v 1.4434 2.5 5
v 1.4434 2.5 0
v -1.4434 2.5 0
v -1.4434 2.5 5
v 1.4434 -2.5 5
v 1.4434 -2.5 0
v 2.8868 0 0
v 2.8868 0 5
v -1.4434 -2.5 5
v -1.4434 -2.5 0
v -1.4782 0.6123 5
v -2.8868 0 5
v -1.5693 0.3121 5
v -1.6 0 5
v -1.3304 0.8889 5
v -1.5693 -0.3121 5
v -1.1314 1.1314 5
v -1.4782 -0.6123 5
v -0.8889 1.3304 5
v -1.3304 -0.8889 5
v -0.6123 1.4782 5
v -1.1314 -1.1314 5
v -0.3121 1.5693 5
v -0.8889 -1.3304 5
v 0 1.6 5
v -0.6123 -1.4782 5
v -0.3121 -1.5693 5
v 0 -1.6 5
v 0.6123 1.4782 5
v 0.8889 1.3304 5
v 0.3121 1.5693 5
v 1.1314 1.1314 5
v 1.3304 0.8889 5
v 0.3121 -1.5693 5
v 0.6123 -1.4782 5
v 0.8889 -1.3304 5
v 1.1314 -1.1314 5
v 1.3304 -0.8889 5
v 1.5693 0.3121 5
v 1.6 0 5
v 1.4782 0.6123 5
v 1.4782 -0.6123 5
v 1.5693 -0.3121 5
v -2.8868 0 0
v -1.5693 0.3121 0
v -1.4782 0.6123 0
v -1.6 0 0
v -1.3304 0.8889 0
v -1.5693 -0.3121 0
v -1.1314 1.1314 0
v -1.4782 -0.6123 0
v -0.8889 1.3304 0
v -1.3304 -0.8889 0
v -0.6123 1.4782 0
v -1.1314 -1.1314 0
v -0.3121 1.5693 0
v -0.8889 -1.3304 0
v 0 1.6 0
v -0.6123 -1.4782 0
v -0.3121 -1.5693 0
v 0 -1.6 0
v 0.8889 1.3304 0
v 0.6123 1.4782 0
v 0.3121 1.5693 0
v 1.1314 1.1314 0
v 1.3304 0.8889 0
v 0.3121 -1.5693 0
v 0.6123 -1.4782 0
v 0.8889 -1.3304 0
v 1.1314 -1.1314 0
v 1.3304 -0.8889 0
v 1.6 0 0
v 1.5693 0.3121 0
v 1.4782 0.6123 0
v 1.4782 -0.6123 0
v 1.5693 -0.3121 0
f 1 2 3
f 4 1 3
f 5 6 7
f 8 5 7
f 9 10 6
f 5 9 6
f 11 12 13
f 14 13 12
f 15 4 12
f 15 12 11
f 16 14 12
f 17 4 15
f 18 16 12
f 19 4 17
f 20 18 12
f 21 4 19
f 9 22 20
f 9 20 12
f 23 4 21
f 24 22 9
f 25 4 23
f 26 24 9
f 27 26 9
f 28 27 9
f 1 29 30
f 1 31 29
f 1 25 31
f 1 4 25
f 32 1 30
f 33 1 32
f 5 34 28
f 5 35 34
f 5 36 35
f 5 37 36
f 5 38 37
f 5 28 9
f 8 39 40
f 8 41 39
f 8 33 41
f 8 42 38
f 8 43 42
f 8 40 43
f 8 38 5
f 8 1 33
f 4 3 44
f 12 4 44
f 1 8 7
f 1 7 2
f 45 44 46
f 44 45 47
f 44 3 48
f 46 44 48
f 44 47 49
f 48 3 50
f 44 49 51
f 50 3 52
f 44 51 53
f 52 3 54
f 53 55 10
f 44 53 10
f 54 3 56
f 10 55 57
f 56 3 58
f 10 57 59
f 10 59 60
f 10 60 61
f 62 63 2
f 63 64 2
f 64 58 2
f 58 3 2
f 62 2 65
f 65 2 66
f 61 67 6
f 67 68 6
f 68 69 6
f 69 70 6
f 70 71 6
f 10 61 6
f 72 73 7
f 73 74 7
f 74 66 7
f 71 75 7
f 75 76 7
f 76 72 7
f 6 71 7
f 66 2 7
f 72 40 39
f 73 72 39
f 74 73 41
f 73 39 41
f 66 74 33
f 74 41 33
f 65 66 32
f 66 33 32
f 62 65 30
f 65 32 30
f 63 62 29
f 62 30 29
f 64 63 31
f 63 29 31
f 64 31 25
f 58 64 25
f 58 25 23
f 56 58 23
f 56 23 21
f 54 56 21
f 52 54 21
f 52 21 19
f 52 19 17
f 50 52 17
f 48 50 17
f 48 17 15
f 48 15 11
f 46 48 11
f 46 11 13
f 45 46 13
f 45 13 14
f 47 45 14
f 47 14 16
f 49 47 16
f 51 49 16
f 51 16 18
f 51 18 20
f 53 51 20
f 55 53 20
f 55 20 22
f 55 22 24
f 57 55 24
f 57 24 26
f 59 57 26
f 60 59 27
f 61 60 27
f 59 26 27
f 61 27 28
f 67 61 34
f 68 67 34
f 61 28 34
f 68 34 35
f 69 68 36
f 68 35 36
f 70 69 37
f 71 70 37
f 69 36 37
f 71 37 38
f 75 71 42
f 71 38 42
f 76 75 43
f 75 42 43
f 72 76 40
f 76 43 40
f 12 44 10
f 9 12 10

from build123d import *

# Parameters (mm, degrees)
F1_DEPTH = 5
F2_COUNT = 6
F2_ANGLE = 300
F3_R     = 1.6
F4_DEPTH = 5.001


with BuildPart() as f1:
    # F0 (on Top) → F1 (new body)
    with BuildSketch(Plane.XY):
        Polygon((-1.443376, 2.5), (0, 0), (1.443376, 2.5), align=None)
    extrude(amount=F1_DEPTH)

    # F2: F1 ×6 about axis
    f2_axis = Axis((0, 0, 2.5), (0, 0, 1))


with BuildPart() as f1_1:
    add(f1.part)
    for i in range(1, F2_COUNT):
        add(f1.part.rotate(f2_axis, i * F2_ANGLE / (F2_COUNT - 1)))

    # F3 (on face) → F4 (cut, through all)
    with BuildSketch(Plane.XY.offset(5)):
        Circle(F3_R)
    extrude(amount=-F4_DEPTH, mode=Mode.SUBTRACT)


solid = f1_1.part
